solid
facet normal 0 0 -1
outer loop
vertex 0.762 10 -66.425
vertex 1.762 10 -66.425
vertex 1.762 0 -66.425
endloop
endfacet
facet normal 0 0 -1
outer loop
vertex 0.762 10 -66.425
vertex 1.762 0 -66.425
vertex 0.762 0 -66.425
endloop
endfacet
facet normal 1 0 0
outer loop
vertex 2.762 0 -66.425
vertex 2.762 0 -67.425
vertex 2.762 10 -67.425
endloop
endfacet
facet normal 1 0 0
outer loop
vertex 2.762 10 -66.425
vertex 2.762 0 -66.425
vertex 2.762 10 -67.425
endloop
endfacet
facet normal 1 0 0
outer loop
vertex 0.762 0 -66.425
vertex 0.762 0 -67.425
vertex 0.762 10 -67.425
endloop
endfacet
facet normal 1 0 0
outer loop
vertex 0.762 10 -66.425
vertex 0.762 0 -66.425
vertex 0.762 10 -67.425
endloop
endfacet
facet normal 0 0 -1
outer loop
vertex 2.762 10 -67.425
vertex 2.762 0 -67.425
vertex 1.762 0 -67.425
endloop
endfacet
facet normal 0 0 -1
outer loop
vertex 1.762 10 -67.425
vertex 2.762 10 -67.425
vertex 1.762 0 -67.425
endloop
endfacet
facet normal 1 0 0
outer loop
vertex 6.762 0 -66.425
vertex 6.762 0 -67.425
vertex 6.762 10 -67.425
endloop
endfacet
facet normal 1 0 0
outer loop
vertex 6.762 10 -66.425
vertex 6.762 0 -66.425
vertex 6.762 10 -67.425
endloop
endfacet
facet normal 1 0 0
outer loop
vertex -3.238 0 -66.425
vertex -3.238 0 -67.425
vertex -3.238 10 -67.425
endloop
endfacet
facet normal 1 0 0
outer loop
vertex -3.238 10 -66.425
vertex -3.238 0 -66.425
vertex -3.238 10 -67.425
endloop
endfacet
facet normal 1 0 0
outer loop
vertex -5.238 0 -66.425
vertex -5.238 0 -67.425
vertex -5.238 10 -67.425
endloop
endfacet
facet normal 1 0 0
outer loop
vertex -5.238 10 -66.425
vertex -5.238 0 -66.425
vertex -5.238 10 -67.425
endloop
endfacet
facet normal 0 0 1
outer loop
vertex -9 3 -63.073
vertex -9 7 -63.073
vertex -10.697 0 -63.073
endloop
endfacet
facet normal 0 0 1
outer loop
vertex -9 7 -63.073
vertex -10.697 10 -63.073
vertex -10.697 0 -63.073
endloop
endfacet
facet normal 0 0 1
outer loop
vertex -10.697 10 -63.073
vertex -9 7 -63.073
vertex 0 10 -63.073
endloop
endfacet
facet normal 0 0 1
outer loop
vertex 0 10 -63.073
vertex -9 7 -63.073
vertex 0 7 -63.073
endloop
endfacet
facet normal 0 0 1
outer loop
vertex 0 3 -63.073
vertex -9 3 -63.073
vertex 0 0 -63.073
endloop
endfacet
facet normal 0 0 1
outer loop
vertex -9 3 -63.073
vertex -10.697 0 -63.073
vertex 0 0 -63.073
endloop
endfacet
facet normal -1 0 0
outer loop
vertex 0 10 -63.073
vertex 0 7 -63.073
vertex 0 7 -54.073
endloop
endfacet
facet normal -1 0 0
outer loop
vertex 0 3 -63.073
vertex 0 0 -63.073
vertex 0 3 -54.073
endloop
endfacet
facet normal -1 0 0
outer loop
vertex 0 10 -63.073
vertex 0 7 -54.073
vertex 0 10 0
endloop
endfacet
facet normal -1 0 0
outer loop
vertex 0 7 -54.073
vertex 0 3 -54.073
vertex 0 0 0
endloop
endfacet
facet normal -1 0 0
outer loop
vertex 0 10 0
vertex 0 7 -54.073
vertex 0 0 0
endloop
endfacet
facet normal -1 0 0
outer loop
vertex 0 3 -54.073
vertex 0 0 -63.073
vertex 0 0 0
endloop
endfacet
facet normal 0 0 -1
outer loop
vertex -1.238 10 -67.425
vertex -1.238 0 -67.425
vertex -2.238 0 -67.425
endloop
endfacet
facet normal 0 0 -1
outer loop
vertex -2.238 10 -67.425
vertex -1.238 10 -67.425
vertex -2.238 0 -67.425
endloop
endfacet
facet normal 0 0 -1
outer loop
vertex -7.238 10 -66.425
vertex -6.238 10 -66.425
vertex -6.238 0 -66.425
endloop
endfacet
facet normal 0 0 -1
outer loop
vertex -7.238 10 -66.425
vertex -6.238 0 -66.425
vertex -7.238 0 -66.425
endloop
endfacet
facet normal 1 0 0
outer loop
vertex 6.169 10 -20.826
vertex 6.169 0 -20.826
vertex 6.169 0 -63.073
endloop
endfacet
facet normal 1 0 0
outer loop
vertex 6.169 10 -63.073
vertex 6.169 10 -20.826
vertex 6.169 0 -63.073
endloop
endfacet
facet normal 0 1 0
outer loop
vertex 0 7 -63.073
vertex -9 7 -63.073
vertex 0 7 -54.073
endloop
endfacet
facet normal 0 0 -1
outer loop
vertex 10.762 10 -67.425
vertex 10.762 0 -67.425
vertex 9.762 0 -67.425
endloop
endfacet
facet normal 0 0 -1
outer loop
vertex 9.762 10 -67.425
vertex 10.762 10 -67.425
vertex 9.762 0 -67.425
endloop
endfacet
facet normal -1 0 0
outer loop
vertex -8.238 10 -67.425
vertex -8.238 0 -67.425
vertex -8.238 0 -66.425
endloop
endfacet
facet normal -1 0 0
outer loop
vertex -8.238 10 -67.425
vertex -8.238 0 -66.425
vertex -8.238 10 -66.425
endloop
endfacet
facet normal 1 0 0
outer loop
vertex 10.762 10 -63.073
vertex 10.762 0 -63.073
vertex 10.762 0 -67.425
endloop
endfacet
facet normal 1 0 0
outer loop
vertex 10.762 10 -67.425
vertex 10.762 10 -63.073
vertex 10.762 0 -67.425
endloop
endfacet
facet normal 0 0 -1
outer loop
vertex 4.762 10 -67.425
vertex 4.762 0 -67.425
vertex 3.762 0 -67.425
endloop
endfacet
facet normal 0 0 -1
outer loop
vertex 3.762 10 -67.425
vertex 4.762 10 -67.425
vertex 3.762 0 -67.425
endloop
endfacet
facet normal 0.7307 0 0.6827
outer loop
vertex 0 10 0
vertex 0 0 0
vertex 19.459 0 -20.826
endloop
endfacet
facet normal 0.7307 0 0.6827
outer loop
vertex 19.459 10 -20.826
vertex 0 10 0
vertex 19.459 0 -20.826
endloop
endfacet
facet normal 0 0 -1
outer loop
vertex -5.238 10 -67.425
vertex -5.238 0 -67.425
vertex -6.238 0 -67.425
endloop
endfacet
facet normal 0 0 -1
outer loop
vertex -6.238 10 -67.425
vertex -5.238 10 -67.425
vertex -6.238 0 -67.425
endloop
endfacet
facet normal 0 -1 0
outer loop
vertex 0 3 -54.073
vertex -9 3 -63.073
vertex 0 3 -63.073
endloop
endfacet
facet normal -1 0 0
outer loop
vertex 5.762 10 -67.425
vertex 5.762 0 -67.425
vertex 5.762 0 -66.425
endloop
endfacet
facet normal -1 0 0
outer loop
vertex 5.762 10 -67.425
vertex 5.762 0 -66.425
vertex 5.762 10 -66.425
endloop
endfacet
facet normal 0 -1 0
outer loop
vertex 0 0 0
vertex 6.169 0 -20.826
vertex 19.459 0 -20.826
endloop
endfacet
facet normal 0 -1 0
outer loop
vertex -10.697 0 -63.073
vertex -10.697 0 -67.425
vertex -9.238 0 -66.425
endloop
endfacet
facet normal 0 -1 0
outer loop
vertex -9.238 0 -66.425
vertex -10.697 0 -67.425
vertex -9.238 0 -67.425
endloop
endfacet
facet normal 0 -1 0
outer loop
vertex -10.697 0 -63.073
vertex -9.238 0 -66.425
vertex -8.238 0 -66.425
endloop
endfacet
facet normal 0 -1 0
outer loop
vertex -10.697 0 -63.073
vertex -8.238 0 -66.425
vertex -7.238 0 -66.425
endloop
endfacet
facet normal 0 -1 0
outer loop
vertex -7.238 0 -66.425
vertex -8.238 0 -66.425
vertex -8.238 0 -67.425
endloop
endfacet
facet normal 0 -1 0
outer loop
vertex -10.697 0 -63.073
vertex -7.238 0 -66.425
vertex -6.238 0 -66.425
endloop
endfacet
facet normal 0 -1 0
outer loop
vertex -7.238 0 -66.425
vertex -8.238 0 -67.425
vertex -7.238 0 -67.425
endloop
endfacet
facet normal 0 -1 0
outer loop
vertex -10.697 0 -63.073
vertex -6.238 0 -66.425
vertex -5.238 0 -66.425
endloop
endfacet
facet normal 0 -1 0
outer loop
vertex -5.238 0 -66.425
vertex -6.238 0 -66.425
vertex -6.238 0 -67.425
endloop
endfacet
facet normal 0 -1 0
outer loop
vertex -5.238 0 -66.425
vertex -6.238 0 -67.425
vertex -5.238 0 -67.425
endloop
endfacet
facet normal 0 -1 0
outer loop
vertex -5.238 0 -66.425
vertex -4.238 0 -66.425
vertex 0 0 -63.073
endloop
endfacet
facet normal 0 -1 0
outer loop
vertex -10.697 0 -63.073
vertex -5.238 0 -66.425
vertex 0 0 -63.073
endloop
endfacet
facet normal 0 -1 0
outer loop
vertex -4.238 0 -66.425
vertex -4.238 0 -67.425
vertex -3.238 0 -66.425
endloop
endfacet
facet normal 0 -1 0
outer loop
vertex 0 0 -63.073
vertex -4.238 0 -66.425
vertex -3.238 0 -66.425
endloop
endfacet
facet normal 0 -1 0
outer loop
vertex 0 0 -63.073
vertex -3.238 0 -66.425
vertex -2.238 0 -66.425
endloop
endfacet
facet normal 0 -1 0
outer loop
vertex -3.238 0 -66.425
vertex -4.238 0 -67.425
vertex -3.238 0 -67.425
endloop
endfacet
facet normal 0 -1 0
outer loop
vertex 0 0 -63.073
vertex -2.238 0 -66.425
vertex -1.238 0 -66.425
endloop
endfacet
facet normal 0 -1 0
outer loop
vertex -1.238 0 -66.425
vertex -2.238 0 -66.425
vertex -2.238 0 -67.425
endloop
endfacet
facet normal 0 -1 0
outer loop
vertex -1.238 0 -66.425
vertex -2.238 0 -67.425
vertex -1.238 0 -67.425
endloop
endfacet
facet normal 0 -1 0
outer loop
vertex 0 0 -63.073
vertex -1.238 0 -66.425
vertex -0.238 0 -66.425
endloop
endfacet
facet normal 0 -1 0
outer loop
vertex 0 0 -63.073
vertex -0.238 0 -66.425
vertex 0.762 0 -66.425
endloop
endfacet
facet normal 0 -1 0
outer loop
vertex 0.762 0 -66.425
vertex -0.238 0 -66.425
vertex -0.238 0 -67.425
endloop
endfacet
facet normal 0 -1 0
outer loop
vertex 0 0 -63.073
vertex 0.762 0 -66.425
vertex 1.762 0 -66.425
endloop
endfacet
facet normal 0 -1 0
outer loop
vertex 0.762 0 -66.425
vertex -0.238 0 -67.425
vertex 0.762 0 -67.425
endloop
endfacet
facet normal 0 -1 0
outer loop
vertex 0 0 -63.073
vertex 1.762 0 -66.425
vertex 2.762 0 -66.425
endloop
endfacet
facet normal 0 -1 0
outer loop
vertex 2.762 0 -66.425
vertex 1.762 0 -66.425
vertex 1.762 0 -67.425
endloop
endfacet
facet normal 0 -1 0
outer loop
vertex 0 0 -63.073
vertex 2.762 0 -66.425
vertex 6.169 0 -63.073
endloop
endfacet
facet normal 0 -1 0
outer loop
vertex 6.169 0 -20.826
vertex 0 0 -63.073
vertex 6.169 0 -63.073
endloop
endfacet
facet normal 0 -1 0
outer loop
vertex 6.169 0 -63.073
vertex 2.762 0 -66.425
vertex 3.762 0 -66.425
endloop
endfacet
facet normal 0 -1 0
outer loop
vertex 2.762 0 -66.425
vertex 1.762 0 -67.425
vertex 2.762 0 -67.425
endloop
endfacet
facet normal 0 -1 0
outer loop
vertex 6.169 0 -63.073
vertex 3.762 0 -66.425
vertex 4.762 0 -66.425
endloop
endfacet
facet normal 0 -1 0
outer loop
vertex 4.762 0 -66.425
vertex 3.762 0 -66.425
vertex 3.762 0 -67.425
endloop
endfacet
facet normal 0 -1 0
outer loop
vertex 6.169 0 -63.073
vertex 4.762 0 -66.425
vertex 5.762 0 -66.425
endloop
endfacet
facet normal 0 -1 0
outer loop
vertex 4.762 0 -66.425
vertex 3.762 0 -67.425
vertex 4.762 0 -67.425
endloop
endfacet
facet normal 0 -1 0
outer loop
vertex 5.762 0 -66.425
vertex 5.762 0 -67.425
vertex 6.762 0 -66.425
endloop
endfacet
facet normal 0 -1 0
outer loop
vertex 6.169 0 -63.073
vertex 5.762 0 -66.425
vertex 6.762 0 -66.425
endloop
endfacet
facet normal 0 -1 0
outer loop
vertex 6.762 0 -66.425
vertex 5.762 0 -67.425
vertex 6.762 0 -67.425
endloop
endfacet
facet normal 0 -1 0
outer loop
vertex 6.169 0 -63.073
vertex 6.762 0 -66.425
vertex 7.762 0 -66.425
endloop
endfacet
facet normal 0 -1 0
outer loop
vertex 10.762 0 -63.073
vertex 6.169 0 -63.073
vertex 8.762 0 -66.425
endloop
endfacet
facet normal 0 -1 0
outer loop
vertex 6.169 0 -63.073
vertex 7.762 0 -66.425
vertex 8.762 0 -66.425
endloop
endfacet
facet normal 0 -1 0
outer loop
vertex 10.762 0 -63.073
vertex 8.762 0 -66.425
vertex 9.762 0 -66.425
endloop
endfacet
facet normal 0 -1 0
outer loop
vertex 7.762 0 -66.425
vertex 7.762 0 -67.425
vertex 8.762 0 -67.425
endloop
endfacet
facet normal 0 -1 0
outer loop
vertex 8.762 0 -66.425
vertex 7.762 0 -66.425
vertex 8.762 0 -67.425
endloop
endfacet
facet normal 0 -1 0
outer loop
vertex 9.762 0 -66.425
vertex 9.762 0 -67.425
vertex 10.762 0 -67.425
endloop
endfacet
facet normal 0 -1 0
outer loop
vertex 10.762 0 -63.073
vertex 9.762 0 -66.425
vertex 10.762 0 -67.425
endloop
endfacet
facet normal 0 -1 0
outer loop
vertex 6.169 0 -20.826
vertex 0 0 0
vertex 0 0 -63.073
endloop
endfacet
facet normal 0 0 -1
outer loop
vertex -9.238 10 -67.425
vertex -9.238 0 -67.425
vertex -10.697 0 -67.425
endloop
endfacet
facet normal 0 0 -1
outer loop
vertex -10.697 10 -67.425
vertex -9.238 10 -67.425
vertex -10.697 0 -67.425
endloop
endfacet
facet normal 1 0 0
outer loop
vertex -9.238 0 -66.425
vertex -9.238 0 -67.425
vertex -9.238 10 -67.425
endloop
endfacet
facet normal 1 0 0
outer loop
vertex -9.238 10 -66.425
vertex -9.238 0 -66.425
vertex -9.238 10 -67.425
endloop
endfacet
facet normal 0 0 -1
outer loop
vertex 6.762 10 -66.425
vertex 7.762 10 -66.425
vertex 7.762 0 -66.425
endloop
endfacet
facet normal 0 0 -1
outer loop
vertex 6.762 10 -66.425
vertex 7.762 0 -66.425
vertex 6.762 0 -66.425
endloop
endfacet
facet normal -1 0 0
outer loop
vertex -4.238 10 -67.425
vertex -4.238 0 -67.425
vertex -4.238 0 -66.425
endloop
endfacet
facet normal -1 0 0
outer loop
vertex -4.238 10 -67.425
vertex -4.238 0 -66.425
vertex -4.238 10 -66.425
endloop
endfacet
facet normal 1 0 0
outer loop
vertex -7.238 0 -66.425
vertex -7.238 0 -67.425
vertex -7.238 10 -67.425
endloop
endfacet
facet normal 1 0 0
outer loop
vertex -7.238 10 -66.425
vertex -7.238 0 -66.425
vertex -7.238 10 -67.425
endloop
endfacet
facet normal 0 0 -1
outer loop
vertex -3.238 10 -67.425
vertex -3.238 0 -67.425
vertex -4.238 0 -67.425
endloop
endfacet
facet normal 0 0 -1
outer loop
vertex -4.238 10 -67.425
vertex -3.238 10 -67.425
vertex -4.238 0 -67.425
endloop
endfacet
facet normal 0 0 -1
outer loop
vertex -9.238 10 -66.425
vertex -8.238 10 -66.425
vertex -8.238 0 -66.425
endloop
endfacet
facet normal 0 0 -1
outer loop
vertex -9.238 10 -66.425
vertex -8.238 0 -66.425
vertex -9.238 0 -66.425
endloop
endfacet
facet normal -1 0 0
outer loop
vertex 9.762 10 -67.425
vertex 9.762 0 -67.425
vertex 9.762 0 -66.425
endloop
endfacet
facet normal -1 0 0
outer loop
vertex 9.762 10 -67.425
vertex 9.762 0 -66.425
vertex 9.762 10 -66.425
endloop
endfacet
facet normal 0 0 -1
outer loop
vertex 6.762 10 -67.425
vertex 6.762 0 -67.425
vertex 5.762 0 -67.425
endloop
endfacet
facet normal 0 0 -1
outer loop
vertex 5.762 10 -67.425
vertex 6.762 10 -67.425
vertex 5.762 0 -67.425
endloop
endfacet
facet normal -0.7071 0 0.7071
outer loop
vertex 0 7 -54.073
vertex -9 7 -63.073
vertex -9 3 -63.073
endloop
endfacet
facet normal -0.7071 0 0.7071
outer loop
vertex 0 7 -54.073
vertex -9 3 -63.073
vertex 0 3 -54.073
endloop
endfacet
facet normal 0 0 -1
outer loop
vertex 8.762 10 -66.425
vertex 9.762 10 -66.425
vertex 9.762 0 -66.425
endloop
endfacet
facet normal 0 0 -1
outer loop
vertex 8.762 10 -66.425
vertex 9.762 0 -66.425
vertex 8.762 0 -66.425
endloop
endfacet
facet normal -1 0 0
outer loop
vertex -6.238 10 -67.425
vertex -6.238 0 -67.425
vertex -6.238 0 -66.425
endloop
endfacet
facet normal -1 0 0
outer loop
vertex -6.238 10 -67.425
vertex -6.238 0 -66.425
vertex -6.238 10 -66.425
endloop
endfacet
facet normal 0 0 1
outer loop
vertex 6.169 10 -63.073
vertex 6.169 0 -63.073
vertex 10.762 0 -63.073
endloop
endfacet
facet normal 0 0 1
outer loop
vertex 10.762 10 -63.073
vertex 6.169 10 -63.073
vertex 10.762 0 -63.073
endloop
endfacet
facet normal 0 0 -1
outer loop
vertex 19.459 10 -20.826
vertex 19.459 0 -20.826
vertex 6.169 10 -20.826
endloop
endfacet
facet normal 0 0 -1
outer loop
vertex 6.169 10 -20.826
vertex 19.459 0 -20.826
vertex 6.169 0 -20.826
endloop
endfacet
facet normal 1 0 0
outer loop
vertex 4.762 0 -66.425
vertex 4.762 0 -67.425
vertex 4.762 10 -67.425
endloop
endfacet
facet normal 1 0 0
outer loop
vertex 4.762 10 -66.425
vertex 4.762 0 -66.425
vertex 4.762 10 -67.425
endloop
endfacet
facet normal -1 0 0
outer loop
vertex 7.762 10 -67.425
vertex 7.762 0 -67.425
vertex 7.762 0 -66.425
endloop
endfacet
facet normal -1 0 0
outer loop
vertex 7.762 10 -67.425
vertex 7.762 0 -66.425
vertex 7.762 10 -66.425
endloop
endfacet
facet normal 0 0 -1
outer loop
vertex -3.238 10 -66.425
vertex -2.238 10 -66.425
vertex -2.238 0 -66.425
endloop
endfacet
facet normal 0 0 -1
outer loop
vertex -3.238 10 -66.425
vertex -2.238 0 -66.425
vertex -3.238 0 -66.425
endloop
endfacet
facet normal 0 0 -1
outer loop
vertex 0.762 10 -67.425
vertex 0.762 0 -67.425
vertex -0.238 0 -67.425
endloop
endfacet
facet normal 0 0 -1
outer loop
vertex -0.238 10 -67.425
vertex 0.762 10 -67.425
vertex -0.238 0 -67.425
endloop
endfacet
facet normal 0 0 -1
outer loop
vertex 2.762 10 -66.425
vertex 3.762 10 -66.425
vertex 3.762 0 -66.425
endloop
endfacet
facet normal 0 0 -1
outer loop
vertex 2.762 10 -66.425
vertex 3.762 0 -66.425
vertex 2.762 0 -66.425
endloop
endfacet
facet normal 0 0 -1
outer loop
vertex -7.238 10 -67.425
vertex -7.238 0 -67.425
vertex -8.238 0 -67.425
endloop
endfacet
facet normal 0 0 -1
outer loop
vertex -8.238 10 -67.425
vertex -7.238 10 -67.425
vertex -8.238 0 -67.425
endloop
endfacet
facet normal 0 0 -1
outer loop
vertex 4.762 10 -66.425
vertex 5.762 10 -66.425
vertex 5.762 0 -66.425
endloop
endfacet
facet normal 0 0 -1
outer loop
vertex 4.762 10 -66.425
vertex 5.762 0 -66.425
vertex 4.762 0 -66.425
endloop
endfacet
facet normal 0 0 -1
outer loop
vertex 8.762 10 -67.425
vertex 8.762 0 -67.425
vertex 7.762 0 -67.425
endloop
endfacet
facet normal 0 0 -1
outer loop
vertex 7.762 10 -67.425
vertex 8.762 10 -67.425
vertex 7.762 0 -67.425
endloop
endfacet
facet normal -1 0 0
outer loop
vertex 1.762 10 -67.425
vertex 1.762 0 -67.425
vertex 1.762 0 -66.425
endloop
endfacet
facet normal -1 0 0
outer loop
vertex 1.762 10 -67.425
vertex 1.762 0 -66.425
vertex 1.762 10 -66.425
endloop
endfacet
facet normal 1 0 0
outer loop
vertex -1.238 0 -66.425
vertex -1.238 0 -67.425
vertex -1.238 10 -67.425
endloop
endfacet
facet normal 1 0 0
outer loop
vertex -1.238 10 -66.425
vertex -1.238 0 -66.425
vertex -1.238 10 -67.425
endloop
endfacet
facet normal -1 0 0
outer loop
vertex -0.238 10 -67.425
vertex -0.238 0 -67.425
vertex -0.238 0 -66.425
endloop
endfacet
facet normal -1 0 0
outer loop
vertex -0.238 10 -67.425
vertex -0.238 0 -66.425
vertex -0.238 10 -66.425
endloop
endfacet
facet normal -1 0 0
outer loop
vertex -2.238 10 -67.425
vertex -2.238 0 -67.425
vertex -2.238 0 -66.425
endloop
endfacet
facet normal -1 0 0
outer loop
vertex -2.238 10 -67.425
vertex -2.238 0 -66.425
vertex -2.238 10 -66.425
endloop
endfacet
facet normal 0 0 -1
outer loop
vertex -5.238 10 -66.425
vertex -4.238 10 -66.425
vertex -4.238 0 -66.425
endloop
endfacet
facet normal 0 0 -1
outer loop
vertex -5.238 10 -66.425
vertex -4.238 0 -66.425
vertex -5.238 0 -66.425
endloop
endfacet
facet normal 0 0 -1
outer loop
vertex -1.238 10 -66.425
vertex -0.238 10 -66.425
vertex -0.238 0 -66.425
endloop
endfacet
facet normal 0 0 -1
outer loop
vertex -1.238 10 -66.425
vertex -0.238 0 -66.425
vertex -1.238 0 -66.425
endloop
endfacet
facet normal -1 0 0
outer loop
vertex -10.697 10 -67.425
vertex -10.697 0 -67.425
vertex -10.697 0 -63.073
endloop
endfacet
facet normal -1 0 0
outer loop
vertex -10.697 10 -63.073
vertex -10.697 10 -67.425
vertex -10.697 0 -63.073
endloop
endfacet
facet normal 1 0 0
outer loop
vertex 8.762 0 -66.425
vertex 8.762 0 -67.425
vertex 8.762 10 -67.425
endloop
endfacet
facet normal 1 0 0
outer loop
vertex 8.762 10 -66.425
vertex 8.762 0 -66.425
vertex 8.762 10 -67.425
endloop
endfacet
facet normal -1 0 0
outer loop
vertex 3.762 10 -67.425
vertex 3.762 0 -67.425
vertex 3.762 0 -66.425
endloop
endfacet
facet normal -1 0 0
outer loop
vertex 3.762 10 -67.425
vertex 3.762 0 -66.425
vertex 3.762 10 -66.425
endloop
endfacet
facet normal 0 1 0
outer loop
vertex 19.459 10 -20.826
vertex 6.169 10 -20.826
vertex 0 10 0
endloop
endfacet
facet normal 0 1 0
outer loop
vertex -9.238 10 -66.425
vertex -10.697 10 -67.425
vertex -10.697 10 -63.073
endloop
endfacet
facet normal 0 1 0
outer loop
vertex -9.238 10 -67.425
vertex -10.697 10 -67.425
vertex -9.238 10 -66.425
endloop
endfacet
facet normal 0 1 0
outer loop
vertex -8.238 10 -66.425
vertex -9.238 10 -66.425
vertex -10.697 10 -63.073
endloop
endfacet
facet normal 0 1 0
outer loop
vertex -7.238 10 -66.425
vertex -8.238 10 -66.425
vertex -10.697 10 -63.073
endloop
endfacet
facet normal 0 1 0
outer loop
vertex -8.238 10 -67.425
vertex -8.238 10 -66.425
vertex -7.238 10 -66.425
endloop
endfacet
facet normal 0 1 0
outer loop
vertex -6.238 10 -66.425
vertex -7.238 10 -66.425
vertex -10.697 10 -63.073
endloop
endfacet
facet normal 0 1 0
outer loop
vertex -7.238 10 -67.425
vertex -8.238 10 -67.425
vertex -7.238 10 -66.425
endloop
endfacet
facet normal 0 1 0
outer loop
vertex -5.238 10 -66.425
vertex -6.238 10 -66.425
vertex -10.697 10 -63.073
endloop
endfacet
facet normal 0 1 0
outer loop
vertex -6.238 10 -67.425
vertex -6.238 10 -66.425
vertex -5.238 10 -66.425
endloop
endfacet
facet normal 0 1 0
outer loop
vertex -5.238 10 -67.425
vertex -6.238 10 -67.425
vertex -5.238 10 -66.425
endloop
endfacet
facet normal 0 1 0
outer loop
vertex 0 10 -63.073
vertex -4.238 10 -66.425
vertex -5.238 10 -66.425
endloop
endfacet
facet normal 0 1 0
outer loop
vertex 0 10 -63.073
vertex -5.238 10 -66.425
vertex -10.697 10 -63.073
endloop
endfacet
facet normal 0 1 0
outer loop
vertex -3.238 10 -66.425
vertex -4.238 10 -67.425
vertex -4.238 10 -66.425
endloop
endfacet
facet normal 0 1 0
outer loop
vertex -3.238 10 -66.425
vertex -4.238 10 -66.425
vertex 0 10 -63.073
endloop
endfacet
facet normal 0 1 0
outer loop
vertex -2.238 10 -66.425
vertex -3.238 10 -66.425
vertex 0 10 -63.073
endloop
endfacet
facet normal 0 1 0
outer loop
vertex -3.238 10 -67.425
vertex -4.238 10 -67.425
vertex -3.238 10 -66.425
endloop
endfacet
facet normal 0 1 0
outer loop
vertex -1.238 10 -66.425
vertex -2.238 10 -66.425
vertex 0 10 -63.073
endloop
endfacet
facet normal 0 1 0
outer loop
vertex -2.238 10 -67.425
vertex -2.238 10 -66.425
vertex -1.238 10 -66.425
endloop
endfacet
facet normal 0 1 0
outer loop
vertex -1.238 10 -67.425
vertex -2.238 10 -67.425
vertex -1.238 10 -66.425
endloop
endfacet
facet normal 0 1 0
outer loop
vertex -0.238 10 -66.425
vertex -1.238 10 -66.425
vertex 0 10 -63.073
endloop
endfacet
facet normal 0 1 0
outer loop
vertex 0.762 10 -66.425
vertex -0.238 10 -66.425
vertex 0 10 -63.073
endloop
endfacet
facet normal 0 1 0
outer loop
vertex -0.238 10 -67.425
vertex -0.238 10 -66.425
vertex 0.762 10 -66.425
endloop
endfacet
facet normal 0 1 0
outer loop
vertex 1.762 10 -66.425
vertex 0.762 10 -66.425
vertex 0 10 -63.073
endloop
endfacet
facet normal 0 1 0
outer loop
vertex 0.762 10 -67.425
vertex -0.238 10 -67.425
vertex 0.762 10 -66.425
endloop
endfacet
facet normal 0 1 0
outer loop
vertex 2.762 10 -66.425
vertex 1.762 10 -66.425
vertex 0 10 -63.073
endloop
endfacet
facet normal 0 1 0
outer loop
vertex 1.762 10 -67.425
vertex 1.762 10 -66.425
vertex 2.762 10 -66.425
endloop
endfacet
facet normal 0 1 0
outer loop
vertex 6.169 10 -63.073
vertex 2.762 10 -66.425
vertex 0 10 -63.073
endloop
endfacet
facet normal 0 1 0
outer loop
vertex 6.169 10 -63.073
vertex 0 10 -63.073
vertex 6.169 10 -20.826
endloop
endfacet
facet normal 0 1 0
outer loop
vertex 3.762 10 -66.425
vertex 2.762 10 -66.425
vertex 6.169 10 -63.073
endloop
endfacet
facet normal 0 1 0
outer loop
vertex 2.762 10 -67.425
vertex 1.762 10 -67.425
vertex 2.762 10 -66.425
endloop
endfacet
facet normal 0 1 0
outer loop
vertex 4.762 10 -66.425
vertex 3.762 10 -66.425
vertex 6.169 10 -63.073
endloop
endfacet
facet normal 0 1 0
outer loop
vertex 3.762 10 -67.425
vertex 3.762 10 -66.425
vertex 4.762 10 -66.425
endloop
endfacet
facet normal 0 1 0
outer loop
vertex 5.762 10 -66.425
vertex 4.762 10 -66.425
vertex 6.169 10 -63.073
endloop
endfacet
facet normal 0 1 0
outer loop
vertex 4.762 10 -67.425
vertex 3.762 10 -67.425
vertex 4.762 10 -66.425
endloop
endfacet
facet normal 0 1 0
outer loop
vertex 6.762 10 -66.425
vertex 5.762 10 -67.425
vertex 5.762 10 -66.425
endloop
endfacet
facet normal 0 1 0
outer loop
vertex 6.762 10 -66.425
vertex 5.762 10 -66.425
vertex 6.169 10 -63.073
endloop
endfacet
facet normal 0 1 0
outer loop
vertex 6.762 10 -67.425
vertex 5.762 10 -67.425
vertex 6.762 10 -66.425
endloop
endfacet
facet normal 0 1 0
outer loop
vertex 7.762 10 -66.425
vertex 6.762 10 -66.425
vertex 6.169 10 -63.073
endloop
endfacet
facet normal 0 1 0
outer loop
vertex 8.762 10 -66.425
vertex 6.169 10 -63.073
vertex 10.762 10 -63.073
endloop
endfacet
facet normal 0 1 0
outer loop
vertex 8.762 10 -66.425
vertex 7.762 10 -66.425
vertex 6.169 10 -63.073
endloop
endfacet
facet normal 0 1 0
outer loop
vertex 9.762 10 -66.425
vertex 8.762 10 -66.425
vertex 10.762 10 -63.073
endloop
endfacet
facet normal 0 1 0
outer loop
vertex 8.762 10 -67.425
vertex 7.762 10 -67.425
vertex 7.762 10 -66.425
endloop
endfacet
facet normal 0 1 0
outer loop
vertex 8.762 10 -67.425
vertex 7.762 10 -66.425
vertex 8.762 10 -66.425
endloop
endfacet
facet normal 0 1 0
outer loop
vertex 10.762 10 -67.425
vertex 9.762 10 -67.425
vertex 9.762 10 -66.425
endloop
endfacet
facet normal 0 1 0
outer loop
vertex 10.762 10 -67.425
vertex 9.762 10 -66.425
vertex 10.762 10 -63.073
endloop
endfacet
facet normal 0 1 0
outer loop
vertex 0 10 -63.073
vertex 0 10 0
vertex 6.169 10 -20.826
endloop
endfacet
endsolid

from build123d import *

# Parameters (mm, degrees)
EXTRUDE_1_DEPTH        = 10
EXTRUDE_2_DEPTH        = 2
EXTRUDE_2_DEPTH_BACK   = 2
SKETCH_4_W             = 1
SKETCH_4_H             = 10
CUT_EXTRUDE_2_DEPTH    = 1
PATTERN_LINEAR_2_COUNT = 10
PATTERN_LINEAR_2_PITCH = 2


with BuildPart() as part:
    # Эскиз1 → Бобышка-Вытянуть1 (new body)
    with BuildSketch(Plane(origin=(0, 0, 0), x_dir=(1, 0, 0), z_dir=(0, 1, 0))):
        Polygon((0, 0), (19.459034366, 20.826435939), (6.168868081, 20.826435939), (6.168868081, 63.073215602), (10.762186387, 63.073215602), (10.762186387, 67.42510234), (-10.697117185, 67.42510234), (-10.697117185, 63.073215602), (0, 63.073215602), align=None)
    extrude(amount=EXTRUDE_1_DEPTH)

    # Эскиз3 → Бобышка-Вытянуть2 (add, two sides: drawn at the far end of the back side and taken through both)
    with BuildSketch(Plane(origin=(0, 5, 0), x_dir=(-1, 0, 0), z_dir=(0, -1, 0)).offset(-EXTRUDE_2_DEPTH_BACK)):
        Polygon((9, 63.073215602), (0, 54.073215602), (0, 63.073215602), align=None)
    extrude(amount=EXTRUDE_2_DEPTH + EXTRUDE_2_DEPTH_BACK)

    # Эскиз4 → Вырез-Вытянуть2 (cut)
    with BuildSketch(Plane(origin=(0, 0, -67.42510234), x_dir=(-1, 0, 0), z_dir=(0, 0, -1))):
        with Locations((-9.262186387, 5)):
            Rectangle(SKETCH_4_W, SKETCH_4_H)
    cut_extrude_2 = extrude(amount=-CUT_EXTRUDE_2_DEPTH, mode=Mode.SUBTRACT)

    # Линейный массив2: Вырез-Вытянуть2 ×10
    with Locations(*[(-i * PATTERN_LINEAR_2_PITCH, 0, 0) for i in range(1, PATTERN_LINEAR_2_COUNT)]):
        add(cut_extrude_2, mode=Mode.SUBTRACT)


solid = part.part
